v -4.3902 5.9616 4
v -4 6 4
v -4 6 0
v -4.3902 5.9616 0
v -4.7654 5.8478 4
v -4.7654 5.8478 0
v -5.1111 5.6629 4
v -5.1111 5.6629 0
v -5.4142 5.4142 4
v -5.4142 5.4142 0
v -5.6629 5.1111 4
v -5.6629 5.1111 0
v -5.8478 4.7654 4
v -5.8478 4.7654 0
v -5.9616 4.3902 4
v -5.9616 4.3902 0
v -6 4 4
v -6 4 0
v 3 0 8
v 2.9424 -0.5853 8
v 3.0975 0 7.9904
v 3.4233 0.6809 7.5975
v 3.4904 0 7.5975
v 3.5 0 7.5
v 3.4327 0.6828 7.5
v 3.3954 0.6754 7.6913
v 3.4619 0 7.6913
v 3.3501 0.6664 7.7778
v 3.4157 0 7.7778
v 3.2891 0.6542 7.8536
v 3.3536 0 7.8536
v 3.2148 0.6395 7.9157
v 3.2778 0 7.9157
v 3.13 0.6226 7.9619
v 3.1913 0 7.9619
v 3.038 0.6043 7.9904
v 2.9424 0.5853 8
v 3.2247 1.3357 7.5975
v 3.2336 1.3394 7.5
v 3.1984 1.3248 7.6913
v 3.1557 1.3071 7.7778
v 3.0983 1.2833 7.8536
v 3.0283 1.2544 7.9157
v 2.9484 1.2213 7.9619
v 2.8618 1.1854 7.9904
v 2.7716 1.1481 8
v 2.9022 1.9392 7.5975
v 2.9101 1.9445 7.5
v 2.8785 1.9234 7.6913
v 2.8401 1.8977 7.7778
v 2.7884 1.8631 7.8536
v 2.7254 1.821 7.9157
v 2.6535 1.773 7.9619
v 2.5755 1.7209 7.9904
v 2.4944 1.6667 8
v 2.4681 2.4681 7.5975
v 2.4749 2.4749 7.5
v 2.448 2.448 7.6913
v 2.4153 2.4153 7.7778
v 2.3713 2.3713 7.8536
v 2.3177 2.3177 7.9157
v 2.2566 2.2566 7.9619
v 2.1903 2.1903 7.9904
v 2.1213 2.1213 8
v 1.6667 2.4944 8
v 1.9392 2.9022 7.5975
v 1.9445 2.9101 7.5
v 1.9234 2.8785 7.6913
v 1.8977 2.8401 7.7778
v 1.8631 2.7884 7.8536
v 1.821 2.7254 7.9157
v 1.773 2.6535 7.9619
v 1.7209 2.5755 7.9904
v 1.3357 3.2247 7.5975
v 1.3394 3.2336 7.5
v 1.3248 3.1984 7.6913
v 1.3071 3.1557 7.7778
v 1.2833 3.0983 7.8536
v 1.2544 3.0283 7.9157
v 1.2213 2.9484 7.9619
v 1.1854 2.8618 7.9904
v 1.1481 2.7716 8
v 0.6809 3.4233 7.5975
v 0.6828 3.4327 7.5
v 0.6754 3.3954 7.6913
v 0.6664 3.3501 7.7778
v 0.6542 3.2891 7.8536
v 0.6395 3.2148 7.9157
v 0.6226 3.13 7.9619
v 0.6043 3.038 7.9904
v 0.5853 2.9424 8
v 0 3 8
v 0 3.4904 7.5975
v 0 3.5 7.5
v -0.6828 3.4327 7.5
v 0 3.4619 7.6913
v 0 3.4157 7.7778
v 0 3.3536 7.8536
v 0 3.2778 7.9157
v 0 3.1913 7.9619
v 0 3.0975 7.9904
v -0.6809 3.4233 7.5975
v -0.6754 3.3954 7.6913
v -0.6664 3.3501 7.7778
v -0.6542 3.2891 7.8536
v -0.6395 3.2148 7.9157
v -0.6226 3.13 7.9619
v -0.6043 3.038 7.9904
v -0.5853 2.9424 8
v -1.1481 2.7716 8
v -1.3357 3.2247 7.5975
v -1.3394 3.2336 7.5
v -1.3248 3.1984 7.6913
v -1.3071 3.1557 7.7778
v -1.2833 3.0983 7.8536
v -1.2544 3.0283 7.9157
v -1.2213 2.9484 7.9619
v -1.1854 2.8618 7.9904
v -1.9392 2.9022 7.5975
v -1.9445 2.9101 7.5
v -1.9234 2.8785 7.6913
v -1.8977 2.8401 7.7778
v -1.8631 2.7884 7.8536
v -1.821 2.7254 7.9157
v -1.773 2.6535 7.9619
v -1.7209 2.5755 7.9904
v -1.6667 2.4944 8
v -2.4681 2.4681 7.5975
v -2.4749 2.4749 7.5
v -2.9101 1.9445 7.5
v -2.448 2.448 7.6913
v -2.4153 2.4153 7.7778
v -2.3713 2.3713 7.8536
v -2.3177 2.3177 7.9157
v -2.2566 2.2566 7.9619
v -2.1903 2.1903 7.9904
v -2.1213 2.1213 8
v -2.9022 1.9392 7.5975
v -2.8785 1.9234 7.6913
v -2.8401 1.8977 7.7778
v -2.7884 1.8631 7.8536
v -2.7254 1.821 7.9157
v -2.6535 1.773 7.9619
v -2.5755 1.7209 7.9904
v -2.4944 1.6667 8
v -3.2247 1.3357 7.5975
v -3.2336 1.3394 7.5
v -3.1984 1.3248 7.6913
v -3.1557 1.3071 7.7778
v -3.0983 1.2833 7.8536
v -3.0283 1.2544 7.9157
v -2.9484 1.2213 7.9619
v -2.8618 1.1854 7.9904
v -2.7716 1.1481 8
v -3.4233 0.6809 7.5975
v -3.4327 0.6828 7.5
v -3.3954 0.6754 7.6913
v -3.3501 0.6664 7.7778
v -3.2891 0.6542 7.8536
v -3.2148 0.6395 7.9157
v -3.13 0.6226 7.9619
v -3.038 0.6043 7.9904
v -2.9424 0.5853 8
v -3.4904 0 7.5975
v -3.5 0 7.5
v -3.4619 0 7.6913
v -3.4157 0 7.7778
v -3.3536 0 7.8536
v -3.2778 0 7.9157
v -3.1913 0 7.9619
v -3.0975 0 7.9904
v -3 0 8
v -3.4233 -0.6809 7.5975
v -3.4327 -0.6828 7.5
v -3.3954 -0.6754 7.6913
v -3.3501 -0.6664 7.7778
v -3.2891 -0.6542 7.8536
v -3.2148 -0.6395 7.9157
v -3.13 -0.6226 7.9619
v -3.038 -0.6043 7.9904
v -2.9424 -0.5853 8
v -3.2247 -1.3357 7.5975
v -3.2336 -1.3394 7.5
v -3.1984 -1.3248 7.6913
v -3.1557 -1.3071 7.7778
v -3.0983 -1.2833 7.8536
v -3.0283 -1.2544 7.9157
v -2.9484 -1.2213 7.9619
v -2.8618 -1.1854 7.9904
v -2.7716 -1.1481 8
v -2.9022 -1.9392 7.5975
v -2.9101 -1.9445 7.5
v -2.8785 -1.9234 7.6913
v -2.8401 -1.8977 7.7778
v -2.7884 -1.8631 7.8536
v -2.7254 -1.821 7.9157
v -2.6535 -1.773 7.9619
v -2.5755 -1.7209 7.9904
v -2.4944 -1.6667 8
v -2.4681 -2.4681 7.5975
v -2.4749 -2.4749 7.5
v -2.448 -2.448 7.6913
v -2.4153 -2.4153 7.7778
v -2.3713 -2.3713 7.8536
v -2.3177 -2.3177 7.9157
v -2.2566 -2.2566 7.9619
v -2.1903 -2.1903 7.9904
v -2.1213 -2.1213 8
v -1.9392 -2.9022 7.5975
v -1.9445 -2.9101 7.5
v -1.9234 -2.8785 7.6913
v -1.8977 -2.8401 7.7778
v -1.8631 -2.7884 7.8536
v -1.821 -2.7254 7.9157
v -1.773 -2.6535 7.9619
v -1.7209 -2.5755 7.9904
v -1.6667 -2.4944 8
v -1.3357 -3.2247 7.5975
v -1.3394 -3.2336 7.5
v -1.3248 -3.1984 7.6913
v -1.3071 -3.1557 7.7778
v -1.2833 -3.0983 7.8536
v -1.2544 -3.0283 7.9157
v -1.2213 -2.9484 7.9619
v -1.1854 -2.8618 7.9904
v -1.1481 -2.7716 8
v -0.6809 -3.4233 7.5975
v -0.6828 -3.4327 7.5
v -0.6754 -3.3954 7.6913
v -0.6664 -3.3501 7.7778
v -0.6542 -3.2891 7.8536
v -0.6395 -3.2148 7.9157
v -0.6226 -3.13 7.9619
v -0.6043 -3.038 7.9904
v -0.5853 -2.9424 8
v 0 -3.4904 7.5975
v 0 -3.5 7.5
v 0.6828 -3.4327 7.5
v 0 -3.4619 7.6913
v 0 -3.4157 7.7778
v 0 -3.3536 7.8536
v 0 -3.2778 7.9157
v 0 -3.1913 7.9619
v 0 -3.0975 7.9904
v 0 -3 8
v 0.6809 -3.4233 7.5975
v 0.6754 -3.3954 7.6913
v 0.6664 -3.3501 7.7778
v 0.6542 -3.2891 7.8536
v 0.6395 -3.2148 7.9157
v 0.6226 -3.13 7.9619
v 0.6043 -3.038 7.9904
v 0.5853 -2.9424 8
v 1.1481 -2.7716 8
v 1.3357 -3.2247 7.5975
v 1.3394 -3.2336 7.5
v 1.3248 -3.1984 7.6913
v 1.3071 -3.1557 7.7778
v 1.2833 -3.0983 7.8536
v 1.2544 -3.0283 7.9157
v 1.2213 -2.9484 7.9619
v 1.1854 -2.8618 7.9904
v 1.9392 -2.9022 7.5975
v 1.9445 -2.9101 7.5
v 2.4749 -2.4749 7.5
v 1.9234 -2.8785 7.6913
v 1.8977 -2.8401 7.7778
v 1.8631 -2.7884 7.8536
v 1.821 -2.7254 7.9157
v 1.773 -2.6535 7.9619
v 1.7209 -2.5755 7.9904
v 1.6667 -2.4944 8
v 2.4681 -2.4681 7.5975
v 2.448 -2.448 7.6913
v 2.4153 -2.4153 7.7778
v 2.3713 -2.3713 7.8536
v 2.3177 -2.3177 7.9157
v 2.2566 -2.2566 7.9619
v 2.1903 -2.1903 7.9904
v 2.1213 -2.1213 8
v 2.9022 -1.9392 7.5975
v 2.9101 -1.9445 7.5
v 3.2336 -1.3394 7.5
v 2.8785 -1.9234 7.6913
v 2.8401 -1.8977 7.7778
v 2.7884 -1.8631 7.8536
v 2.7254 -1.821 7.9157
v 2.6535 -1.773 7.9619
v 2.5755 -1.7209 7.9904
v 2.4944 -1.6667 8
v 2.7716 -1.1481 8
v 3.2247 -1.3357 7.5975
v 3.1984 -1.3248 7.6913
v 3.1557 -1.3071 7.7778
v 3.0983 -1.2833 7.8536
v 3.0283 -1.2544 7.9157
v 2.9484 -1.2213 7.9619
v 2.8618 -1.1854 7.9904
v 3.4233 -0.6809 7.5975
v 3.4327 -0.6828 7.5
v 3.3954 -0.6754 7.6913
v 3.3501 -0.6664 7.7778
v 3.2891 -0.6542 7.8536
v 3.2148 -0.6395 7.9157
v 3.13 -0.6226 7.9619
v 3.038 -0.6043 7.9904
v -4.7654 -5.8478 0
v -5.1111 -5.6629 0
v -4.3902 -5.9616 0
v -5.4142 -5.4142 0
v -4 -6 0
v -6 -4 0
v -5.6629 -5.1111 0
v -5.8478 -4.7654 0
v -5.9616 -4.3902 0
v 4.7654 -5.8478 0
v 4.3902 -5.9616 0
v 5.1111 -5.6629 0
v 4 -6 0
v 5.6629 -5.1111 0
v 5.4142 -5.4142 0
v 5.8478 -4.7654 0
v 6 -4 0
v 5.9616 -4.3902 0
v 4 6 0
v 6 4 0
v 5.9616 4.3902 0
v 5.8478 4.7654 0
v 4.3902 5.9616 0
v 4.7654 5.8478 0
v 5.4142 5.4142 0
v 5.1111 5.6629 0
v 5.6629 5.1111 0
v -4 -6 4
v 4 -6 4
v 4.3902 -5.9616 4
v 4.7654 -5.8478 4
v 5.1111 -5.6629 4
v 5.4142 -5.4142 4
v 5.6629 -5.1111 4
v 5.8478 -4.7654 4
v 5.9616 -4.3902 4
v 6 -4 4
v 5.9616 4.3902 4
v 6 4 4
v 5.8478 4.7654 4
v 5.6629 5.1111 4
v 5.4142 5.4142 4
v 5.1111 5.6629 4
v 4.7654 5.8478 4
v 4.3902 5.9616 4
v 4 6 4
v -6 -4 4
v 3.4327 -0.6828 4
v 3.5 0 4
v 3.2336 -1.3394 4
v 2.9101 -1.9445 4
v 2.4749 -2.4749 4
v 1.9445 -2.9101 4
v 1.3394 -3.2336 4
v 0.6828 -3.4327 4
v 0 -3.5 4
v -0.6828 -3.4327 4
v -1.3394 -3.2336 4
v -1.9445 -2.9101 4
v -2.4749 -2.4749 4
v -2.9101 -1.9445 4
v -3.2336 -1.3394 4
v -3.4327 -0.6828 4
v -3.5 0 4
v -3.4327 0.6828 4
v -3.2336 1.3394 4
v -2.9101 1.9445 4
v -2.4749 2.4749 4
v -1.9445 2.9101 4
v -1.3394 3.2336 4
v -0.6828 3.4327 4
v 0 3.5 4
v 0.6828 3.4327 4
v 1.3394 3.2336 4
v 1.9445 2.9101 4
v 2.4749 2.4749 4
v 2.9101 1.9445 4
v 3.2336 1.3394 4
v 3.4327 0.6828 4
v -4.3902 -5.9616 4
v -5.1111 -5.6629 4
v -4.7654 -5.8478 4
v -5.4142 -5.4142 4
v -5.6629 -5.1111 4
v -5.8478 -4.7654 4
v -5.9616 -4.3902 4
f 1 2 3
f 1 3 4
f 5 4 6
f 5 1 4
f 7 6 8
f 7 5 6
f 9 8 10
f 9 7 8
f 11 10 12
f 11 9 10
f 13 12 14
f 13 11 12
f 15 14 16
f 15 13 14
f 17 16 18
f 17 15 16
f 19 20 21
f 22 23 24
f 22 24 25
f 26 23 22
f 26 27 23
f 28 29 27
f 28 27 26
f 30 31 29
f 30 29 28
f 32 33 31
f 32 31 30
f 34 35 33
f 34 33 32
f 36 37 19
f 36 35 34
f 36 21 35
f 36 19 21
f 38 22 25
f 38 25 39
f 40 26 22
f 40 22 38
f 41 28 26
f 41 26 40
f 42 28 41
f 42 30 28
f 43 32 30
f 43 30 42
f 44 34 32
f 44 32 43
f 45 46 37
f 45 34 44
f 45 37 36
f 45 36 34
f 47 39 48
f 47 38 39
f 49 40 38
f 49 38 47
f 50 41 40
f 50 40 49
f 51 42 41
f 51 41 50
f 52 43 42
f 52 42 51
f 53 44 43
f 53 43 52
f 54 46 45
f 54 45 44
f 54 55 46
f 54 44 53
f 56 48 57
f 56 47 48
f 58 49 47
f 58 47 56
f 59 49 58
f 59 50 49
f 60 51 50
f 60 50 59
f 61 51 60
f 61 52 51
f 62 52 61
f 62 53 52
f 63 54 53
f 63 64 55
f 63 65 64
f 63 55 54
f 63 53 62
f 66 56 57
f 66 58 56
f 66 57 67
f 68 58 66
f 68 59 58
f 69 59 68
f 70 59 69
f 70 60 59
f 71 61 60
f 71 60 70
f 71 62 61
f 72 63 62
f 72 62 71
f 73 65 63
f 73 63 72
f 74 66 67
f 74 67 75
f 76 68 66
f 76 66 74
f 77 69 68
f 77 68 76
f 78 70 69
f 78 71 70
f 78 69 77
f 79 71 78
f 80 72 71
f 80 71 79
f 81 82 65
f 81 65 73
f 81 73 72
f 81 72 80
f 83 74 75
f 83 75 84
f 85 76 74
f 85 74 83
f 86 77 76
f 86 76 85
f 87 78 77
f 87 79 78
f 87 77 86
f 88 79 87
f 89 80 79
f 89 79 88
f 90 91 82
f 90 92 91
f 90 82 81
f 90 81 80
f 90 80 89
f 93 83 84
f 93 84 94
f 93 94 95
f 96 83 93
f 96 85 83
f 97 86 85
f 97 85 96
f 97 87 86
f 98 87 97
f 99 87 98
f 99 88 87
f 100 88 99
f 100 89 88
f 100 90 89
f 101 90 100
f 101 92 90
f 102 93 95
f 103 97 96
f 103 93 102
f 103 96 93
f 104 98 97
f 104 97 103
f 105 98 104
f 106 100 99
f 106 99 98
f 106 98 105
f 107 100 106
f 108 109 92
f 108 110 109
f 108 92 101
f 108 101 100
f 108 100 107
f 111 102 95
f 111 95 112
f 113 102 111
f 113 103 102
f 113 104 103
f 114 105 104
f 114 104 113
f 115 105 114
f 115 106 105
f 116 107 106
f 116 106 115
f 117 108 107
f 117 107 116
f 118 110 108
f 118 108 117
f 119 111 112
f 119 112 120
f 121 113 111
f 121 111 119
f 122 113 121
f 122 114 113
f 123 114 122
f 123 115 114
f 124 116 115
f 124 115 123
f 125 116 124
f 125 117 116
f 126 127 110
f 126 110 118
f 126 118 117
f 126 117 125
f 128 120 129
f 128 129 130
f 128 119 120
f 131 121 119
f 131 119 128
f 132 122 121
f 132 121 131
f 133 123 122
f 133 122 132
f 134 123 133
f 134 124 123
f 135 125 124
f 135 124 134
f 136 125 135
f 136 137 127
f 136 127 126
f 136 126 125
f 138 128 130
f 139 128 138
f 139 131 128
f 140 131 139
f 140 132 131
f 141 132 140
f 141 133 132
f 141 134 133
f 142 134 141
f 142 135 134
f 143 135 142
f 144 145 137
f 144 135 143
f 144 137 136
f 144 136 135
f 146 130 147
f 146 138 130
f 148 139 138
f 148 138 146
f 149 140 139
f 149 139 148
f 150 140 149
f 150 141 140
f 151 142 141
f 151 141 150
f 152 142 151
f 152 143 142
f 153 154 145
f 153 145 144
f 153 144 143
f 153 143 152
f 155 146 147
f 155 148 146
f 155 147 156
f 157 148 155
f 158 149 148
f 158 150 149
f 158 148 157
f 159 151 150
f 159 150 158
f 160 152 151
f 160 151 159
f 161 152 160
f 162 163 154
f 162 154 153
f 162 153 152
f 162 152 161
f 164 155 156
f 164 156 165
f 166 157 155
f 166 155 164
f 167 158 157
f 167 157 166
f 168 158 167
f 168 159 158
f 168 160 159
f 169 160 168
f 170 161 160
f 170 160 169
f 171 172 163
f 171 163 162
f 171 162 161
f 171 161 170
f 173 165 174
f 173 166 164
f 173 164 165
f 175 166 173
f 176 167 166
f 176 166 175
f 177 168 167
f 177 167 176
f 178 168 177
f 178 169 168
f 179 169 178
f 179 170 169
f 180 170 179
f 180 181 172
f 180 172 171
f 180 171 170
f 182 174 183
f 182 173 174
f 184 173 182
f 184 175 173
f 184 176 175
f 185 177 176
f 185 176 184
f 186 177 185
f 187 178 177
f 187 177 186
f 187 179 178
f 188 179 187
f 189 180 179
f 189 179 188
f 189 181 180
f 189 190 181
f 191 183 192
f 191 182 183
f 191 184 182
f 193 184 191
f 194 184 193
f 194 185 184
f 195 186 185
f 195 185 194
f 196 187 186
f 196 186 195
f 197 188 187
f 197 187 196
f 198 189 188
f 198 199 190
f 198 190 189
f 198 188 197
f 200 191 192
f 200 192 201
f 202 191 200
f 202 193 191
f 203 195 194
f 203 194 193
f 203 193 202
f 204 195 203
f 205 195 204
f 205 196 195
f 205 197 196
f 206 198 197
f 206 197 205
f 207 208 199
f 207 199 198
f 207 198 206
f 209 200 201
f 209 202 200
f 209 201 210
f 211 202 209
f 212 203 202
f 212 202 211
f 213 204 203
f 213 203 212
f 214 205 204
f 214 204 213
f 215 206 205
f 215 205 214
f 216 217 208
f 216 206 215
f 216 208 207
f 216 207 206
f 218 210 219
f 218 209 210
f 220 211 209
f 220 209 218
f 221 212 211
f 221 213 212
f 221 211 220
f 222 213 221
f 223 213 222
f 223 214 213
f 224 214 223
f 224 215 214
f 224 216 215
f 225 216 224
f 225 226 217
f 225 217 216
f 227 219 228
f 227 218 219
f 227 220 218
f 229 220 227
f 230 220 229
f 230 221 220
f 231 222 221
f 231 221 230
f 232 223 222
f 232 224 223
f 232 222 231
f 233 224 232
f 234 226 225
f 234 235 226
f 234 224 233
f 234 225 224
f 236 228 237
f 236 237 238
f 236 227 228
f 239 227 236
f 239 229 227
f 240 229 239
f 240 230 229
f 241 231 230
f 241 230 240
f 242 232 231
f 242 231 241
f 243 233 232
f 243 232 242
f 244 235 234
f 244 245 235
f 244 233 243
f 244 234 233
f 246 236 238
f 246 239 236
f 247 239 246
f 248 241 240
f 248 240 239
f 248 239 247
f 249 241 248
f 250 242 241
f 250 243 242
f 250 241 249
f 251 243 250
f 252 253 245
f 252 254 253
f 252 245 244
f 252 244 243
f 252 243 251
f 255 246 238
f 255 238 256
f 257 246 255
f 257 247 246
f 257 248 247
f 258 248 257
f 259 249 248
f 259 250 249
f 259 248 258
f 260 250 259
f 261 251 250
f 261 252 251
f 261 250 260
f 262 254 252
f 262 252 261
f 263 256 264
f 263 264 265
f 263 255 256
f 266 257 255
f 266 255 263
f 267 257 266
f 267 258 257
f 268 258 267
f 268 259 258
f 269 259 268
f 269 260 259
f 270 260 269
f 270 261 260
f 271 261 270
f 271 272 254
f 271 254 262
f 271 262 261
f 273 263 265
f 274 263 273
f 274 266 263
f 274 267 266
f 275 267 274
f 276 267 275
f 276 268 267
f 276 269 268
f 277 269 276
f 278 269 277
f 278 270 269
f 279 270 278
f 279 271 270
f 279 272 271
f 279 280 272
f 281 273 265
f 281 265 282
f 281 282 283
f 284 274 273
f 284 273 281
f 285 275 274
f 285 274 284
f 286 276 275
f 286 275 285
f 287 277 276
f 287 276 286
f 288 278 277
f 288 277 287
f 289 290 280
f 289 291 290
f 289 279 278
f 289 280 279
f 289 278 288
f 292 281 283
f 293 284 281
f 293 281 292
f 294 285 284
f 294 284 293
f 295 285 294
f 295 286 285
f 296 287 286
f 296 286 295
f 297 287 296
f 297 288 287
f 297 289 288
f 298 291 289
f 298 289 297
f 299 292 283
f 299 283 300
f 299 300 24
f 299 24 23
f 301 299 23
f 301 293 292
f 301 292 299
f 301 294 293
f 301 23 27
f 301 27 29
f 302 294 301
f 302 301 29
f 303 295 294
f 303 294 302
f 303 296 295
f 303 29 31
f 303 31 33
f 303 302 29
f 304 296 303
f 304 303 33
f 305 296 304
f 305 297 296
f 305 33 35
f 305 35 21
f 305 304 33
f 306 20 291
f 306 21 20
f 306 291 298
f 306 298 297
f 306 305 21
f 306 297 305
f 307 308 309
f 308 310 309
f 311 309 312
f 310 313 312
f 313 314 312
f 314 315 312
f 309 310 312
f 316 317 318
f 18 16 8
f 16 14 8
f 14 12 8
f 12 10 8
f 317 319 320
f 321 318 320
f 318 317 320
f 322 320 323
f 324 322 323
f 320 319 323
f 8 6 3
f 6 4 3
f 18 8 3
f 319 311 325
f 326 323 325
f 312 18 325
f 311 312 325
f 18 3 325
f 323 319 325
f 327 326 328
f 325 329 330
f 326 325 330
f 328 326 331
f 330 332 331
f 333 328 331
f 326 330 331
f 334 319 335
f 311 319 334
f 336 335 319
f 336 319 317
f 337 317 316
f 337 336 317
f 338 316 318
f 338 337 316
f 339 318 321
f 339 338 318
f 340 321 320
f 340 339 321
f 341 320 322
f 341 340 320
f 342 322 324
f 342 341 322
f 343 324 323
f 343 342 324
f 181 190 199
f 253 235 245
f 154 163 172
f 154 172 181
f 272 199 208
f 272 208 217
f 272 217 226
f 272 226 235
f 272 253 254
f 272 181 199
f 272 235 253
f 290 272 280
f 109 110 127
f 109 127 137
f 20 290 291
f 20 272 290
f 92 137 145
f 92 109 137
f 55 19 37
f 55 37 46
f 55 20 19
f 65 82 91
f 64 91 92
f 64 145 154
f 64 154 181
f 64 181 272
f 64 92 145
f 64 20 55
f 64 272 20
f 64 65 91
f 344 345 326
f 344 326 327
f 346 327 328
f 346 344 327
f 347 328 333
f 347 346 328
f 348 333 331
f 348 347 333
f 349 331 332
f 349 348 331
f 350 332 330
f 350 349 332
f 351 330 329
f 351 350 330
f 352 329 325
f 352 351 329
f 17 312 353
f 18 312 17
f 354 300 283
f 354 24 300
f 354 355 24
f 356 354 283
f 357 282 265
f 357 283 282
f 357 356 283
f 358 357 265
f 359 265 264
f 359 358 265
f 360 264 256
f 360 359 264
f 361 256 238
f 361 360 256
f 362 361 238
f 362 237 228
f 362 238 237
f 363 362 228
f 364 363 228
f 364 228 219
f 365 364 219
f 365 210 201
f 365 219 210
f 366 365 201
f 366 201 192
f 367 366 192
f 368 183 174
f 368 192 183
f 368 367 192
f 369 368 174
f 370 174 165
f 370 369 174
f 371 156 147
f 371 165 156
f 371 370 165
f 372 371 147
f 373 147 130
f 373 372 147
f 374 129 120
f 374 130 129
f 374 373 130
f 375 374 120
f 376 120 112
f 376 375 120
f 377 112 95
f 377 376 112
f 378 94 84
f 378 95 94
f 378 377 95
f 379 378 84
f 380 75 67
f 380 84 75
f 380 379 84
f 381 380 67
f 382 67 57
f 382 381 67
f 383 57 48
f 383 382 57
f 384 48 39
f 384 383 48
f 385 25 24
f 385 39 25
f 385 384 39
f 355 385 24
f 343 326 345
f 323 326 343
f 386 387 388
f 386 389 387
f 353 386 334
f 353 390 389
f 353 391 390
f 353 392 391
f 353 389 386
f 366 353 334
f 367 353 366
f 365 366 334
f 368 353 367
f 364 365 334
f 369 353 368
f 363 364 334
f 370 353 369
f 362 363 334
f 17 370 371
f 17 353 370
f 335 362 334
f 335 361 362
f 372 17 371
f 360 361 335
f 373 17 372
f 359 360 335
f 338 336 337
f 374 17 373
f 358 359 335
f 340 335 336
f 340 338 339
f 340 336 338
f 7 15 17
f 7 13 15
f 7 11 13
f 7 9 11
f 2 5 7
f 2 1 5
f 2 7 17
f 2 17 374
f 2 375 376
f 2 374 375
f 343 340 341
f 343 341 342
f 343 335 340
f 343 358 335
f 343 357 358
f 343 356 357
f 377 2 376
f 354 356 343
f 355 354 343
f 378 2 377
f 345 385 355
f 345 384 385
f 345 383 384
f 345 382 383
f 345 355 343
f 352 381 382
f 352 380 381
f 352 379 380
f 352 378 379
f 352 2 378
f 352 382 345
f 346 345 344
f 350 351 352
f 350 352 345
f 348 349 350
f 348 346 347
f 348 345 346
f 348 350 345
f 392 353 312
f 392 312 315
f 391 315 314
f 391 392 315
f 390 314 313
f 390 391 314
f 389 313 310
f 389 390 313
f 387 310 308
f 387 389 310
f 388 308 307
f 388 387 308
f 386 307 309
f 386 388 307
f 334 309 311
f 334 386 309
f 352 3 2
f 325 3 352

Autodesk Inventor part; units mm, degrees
ref_plane "YZ Plane" through (0, 0, 0) normal (1, 0, 0) x (0, 1, 0)
ref_plane "XZ Plane" through (0, 0, 0) normal (0, 1, 0) x (-1, 0, 0)
ref_plane "XY Plane" through (0, 0, 0) normal (0, 0, 1) x (1, 0, 0)
sketch "Sketch1" plane through (0, 0, 0) normal (0, 0, 1) x (1, 0, 0)
  line L0 (6, -6) -> (-6, -6)
  line L1 (-6, -6) -> (-6, 6)
  line L2 (-6, 6) -> (6, 6)
  line L3 (6, 6) -> (6, -6)
  point P0 (0, 0)
  point P1 (0, 0)
  dimension "d0" = 12
  dimension "d1" = 12
  dimension "d2" = 6
  dimension "d3" = 6
extrude "Extrusion1" add sketch "Sketch1" along normal blind 4
fillet "Fillet1" radius 2 4 edges at (-6, 6, 2) (-6, -6, 2) (6, 6, 2) (6, -6, 2)
sketch "Sketch2" plane through (0, 0, 4) normal (0, 0, 1) x (1, 0, 0)
  circle A0 centre (0, 0) radius 3.5
  dimension "d7" = 7
extrude "Extrusion2" add sketch "Sketch2" along normal blind 4
fillet "Fillet2" radius 0.5 1 edges at (-3.5, 0, 8)
properties part number "Button" material "PET Plastic"
